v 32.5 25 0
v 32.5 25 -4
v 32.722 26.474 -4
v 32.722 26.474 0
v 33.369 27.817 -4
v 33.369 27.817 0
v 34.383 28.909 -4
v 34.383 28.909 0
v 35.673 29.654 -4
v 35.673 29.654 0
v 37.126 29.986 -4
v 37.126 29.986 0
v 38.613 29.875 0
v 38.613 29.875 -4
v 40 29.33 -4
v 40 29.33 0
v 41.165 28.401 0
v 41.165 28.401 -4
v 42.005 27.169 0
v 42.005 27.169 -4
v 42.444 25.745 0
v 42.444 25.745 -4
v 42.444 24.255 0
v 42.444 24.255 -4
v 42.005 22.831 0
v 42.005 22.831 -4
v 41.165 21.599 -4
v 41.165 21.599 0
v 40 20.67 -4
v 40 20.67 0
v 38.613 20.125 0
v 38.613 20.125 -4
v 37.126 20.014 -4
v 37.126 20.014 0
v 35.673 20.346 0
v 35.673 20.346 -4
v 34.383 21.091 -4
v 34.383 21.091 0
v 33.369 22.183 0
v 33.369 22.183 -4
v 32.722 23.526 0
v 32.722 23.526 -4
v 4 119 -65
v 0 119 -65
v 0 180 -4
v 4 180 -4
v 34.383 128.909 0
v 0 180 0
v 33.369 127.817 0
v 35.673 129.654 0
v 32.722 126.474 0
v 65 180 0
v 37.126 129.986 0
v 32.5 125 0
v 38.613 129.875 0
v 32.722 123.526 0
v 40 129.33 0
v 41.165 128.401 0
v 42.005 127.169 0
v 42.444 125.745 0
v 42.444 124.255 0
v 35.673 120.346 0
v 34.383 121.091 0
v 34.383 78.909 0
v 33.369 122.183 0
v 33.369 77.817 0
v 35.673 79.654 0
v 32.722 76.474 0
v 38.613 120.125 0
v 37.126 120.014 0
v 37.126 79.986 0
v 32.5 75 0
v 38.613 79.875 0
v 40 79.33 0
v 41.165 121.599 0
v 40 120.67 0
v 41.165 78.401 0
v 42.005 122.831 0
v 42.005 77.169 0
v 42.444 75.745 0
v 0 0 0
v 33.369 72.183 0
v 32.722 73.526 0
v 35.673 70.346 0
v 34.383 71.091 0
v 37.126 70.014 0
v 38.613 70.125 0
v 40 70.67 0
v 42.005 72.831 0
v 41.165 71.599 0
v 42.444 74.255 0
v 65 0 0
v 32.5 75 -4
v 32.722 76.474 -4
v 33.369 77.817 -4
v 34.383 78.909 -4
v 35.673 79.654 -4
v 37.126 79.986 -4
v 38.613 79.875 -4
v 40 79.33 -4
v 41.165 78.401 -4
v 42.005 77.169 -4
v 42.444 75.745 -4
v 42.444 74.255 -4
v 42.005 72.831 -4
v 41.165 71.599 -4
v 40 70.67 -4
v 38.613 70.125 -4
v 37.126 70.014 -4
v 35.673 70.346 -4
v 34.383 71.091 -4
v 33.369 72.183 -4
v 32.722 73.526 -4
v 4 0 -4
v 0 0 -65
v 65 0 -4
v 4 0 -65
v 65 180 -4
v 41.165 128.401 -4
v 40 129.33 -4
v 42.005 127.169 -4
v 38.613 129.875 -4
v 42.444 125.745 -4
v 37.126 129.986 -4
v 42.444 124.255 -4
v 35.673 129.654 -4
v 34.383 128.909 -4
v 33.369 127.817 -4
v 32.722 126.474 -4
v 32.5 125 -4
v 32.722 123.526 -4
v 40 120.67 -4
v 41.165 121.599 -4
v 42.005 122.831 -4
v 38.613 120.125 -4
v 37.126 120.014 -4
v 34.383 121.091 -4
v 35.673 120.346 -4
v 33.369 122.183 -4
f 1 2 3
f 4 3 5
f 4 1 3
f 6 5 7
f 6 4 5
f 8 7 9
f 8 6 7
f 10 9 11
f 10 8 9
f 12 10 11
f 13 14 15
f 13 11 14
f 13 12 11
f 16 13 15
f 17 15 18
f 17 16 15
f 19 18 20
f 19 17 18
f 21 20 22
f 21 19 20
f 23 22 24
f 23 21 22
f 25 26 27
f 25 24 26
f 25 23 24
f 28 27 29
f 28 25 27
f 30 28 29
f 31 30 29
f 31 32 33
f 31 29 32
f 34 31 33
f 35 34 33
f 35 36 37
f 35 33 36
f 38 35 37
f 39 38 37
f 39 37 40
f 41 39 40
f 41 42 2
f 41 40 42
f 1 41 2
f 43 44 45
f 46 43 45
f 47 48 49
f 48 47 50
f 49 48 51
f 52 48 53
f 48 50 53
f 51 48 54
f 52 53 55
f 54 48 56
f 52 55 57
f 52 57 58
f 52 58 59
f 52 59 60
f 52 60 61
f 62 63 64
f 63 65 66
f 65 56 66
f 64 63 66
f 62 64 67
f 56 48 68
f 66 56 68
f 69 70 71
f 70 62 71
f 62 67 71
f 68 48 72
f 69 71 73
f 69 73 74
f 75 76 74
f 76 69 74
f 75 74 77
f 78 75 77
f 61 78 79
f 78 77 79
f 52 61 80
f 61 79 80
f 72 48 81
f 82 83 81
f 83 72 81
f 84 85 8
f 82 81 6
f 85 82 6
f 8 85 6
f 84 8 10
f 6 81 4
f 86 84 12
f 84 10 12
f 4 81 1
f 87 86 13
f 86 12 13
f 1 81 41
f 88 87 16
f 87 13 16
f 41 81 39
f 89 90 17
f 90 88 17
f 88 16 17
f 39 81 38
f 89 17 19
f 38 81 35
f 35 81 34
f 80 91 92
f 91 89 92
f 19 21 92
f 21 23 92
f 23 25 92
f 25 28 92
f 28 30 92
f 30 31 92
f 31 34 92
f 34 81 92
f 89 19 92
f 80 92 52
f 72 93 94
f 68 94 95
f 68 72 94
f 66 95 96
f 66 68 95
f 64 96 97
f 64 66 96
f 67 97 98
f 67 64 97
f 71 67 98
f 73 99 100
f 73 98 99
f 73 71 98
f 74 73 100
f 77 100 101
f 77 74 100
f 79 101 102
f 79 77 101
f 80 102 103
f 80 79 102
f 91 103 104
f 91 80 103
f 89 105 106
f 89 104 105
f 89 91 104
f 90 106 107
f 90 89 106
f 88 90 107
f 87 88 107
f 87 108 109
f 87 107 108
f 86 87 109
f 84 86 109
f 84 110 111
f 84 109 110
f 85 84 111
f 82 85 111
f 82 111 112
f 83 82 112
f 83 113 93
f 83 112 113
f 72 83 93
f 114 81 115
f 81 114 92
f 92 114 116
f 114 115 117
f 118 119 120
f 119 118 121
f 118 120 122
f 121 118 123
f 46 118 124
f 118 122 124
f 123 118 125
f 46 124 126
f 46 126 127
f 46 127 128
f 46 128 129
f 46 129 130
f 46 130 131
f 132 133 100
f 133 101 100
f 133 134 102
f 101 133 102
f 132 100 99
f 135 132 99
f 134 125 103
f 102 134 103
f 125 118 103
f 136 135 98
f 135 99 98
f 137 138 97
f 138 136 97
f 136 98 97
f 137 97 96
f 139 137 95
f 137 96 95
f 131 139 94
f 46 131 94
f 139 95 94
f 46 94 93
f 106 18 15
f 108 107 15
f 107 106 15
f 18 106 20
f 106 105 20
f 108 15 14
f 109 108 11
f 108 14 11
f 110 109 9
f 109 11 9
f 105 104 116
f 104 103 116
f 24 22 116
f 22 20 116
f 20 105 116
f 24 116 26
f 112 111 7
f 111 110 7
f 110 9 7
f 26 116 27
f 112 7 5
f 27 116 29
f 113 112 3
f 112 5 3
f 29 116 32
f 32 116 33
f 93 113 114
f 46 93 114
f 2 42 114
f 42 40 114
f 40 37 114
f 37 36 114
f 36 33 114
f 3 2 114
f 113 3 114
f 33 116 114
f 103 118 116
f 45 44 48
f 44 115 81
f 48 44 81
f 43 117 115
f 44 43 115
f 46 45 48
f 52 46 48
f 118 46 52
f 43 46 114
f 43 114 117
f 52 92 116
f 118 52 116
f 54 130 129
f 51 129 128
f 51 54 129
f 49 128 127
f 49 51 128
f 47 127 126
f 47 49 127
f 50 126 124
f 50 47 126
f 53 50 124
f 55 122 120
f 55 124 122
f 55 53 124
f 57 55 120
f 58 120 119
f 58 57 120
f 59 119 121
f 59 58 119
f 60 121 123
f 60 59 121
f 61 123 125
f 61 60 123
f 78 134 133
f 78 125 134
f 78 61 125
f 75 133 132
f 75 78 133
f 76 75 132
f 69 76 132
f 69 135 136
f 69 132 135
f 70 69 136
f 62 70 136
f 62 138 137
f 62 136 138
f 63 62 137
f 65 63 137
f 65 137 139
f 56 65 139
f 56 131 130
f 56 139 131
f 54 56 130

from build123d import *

# Parameters (mm, degrees)
EXTRUDE_1_DEPTH     = 180
SKETCH_6_R          = 5
CUT_EXTRUDE_1_DEPTH = 10
CUT_EXTRUDE_2_DEPTH = 10


with BuildPart() as part:
    # Эскиз1 → Вытянуть-Тонкостенный1 (new body)
    with BuildSketch(Plane(origin=(0, 0, 0), x_dir=(1, 0, 0), z_dir=(0, 1, 0))):
        Polygon((0, 65), (0, 0), (65, 0), (65, 4), (4, 4), (4, 65), align=None)
    extrude(amount=EXTRUDE_1_DEPTH)

    # Эскиз6 → Вырез-Вытянуть1 (cut)
    with BuildSketch(Plane(origin=(0, 0, 0), x_dir=(-1, 0, 0), z_dir=(0, 0, -1))):
        with Locations((-37.5, 25)):
            Circle(SKETCH_6_R)
        with Locations((-37.5, 75)):
            Circle(SKETCH_6_R)
        with Locations((-37.5, 125)):
            Circle(SKETCH_6_R)
    extrude(amount=CUT_EXTRUDE_1_DEPTH, mode=Mode.SUBTRACT)

    # Эскиз9 → Вырез-Вытянуть2 (cut)
    with BuildSketch(Plane.ZY):
        Polygon((-4, 180), (-65, 180), (-65, 119), align=None)
    extrude(amount=-CUT_EXTRUDE_2_DEPTH, mode=Mode.SUBTRACT)


solid = part.part
